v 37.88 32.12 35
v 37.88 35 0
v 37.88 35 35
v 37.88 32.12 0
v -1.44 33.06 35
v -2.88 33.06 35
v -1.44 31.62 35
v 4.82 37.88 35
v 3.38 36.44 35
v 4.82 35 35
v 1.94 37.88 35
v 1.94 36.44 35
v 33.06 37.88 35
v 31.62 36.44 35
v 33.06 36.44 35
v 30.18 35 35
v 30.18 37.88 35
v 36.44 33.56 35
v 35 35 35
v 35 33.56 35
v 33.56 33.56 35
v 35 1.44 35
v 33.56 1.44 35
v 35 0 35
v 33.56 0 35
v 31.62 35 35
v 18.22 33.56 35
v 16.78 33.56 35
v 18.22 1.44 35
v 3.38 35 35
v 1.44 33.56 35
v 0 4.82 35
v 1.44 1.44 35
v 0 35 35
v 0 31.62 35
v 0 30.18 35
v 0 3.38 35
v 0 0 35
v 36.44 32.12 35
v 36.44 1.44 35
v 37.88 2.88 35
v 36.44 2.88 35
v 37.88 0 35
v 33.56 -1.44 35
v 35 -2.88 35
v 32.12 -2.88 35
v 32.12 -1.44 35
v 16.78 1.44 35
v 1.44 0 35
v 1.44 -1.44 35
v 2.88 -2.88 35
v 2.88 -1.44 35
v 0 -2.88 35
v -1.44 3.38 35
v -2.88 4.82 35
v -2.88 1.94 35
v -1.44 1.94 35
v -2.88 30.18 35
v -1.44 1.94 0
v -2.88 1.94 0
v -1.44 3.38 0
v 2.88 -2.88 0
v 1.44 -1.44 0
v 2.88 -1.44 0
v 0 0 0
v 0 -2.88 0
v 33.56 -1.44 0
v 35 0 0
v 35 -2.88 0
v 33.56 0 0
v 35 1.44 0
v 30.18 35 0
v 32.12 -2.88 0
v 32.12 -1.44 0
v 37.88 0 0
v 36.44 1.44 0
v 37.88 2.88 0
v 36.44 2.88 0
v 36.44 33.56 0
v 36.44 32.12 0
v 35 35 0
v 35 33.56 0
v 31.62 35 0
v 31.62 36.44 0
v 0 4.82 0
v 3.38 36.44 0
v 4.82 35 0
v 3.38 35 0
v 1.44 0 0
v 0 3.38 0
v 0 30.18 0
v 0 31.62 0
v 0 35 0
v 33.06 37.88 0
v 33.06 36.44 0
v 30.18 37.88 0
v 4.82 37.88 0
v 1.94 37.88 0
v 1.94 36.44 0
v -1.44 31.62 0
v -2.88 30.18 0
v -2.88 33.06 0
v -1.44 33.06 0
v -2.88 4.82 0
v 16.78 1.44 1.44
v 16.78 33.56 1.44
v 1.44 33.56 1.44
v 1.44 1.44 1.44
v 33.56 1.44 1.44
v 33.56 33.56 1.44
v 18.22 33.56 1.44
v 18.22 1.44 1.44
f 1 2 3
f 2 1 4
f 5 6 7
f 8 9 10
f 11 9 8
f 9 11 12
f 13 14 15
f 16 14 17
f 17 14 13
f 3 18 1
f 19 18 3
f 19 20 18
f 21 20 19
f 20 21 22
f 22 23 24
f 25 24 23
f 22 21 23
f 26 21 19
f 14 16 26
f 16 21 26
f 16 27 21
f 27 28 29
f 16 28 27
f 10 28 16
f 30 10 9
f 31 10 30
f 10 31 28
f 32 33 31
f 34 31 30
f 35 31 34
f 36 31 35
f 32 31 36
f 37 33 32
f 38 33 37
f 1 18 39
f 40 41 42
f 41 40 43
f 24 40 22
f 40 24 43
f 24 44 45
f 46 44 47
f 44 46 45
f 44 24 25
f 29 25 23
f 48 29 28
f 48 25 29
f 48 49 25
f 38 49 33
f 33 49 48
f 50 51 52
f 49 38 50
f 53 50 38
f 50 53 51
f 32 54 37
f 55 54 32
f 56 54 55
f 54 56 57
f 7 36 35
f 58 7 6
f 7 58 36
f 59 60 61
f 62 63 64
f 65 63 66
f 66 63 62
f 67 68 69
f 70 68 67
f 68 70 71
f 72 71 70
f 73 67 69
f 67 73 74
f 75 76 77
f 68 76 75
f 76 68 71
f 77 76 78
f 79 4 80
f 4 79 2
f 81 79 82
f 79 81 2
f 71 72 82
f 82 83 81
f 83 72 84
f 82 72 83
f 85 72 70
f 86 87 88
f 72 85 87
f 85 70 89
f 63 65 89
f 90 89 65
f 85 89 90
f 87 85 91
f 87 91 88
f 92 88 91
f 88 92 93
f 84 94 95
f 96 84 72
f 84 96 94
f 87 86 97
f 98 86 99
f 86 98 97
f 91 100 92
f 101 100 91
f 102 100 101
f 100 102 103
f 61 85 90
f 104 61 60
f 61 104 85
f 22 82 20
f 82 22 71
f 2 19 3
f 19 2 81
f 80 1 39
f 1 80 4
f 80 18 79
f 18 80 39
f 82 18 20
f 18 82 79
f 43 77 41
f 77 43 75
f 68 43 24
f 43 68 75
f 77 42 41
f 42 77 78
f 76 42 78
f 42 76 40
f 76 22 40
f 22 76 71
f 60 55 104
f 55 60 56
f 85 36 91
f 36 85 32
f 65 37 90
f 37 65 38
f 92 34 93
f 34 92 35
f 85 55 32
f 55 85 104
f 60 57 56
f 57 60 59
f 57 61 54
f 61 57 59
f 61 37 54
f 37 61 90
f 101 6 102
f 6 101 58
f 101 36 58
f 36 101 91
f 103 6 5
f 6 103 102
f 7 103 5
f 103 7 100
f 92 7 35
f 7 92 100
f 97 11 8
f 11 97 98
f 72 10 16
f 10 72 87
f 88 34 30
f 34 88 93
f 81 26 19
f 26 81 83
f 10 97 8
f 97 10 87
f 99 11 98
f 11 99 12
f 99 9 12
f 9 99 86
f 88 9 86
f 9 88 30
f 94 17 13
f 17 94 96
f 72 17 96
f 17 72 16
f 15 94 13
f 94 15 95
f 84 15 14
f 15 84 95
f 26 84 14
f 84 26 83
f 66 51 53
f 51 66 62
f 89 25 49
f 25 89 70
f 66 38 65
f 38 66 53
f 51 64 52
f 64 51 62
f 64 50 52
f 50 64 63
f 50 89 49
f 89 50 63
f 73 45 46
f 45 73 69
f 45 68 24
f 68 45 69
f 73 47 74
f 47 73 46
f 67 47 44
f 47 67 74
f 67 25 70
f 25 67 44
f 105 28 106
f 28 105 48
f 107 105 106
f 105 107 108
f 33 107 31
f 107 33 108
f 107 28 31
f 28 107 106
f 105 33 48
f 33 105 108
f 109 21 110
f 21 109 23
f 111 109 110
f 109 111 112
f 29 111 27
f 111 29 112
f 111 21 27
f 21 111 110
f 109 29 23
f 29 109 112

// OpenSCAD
// file: lib/frame.scad
/*
 * frame.scad
 *
 * Part of the Modular Drawer System.
 *
 * (c) 2015 max thom stahl. Released under the Creative Commons Share-Alike
 * license. See LICENSE for details.
 */

module tab1x1() {
  difference() {
    cube([2*wall_thickness, 2*wall_thickness, frame_outer]);
    translate([-1, -1, -1]) cube([wall_thickness + 1, wall_thickness + 1, frame_outer + 2]);
  }
}

module outer_frame() {
  cube([frame_outer, frame_outer, frame_outer]);
  translate([frame_outer, frame_outer - 2*wall_thickness, 0])
     tab1x1();
  translate([frame_outer, 2*wall_thickness, 0])
    scale([1.0, -1.0, 1.0])
    tab1x1();

  translate([0, wall_thickness + tolerance, 0])
    rotate([0, 0, 180])
    scale([1.0, -1.0, 1.0])
    tab1x1();
  translate([0, frame_outer - wall_thickness - tolerance, 0])
    rotate([0, 0, 180])
    tab1x1();

  translate([wall_thickness + tolerance, frame_outer, 0])
    scale([-1.0, 1.0, 1.0])
    rotate([0, 0, 90])
    tab1x1();
  translate([frame_outer - wall_thickness - tolerance, frame_outer, 0])
    rotate([0, 0, 90])
    tab1x1();

  translate([2*wall_thickness, 0, 0])
    scale([-1.0, 1.0, 1.0])
    rotate([0, 0, 270])
    tab1x1();
  translate([frame_outer - 2*wall_thickness, 0, 0])
    rotate([0, 0, 270])
    tab1x1();
}
// file: configuration.scad
/*
 * configuration.scad
 *
 * Part of the Modular Drawer System.
 *
 * (c) 2015 max thom stahl. Released under the Creative Commons Share-Alike
 * license. See LICENSE for details.
 */

// These settings will move into a header file soon
frame_outer = 35.0;
wall_thickness = 0.48 * 3;
frame_inner = frame_outer - 2*wall_thickness;
tolerance = 0.5;

// The rest of the libraries
include <lib/frame.scad>
// main file
/*
 * frame1x2.scad
 *
 * Use this frame with `drawer1x2`.
 *
 * Part of the Modular Drawer System.
 *
 * (c) 2015 max thom stahl. Released under the Creative Commons Share-Alike
 * license. See LICENSE for details.
 */

include <configuration.scad>;

difference() {
  outer_frame();
  translate([wall_thickness, wall_thickness, wall_thickness])
    cube([(frame_inner - wall_thickness)/2, frame_inner, frame_outer]);
  translate([3*wall_thickness/2 + frame_inner/2, wall_thickness, wall_thickness])
    cube([(frame_inner - wall_thickness)/2, frame_inner, frame_outer]);
}
